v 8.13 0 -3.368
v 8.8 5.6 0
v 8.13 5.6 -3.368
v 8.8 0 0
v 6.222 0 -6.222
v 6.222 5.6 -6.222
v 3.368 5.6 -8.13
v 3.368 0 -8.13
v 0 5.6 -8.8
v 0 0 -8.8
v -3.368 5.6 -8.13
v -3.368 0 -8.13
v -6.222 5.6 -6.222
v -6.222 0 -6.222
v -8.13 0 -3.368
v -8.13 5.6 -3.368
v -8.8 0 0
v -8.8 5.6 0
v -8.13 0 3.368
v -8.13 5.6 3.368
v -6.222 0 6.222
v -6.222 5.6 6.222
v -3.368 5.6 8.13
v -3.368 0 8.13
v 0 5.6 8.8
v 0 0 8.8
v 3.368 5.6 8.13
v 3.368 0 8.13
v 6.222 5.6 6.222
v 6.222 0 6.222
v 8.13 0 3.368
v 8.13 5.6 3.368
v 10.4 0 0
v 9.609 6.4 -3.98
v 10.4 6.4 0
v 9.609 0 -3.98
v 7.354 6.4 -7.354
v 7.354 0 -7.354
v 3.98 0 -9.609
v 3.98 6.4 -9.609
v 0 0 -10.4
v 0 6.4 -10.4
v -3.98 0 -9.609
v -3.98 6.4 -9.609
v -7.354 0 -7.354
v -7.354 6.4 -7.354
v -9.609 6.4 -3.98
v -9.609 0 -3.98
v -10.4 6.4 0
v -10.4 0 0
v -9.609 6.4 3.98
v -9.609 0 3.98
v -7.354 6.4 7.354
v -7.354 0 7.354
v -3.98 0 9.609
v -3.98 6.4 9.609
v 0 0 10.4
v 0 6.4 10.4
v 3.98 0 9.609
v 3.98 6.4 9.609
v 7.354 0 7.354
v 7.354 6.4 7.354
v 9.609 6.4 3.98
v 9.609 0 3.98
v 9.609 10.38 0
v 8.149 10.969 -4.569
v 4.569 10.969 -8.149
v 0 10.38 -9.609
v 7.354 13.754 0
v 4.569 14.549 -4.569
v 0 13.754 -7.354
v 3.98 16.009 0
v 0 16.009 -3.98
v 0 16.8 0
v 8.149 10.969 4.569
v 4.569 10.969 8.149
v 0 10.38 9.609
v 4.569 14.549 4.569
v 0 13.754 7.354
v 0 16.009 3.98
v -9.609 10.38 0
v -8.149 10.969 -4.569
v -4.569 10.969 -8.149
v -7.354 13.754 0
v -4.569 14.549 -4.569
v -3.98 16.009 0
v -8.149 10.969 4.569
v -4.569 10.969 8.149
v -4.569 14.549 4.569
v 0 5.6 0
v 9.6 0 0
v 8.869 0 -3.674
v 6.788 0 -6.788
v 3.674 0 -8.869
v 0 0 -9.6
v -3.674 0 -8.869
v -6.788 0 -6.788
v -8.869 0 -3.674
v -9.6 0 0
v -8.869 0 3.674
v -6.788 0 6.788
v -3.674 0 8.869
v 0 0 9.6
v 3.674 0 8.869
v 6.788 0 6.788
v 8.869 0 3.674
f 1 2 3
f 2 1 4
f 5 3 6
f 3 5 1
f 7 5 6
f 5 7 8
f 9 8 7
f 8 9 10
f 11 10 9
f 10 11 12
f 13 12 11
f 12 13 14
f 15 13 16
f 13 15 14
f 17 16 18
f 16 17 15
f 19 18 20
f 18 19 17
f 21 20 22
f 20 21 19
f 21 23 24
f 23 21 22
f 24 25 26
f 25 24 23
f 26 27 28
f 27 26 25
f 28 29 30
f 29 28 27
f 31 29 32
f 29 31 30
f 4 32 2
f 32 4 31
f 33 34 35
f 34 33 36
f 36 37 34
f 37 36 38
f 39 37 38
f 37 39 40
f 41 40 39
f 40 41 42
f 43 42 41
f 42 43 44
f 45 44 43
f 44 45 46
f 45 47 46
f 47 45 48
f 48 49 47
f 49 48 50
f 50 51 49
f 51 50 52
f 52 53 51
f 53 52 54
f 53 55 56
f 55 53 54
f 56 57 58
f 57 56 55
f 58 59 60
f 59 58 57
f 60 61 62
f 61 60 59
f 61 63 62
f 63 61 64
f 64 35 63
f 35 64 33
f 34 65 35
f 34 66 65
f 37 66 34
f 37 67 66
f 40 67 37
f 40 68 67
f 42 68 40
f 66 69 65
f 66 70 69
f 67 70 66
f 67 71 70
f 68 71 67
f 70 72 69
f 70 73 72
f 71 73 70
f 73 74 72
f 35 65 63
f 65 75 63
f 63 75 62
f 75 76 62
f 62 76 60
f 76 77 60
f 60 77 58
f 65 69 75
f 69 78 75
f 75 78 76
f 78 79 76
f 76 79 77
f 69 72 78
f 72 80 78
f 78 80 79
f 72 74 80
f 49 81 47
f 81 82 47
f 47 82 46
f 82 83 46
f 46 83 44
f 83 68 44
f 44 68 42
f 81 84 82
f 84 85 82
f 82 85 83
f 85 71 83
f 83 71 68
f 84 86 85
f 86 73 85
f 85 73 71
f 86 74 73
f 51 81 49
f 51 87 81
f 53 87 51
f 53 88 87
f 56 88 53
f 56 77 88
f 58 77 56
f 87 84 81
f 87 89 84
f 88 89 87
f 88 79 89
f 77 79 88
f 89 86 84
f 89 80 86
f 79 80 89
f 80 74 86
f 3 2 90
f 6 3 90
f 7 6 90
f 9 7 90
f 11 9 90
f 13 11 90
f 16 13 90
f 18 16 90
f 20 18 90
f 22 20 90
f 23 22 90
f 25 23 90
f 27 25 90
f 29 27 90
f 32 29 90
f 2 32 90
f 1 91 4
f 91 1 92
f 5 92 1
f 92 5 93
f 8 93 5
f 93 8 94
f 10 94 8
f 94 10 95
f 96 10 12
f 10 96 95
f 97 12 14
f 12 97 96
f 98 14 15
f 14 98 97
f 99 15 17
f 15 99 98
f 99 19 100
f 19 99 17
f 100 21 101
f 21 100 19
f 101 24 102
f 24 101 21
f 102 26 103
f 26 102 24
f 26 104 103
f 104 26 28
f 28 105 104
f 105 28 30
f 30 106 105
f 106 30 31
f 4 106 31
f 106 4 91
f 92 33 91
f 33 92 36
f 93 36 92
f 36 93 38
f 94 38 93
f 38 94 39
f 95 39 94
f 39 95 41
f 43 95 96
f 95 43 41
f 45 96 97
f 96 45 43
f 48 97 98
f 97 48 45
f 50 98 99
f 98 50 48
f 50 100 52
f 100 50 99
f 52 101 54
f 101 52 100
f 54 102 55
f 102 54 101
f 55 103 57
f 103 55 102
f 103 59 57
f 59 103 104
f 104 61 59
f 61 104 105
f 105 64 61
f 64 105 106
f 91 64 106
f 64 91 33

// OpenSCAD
// file: ../p/stud3.scad
use <../lib.scad>
use <4-4cyli.scad>
use <4-4disc.scad>
use <4-4edge.scad>
$fa=1; $fs=0.2;
function ldraw_lib__stud3(realsolid=false) = realsolid ? 
    [openscad(translate([0,0,-eps()], o=cylinder(4+eps(), r=4)),2)] : [
// 0 Stud Tube Solid
// 0 Name: stud3.dat
// 0 Author: James Jessiman
// 0 !LDRAW_ORG Primitive UPDATE 2012-01
// 0 !LICENSE Licensed under CC BY 2.0 and CC BY 4.0 : see CAreadme.txt
// 
// 0 BFC CERTIFY CCW
  [0,"BFC","CERTIFY"],
  [0,"BFC","CCW"],
// 
// 0 !HISTORY 2002-04-04 [sbliss] Modified for BFC compliance
// 0 !HISTORY 2002-04-25 [PTadmin] Official Update 2002-02
// 0 !HISTORY 2007-06-24 [PTadmin] Header formatted for Contributor Agreement
// 0 !HISTORY 2008-07-01 [PTadmin] Official Update 2008-01
// 0 !HISTORY 2012-02-16 [Philo] Changed to CCW
// 0 !HISTORY 2012-03-30 [PTadmin] Official Update 2012-01
// 
// 
// 1 16 0 -4 0 4 0 0 0 1 0 0 0 4 4-4edge.dat
  [1,16,0,-4,0,4,0,0,0,1,0,0,0,4, ldraw_lib__4_4edge(realsolid)],
// 1 16 0 0 0 4 0 0 0 1 0 0 0 4 4-4edge.dat
  [1,16,0,0,0,4,0,0,0,1,0,0,0,4, ldraw_lib__4_4edge(realsolid)],
// 1 16 0 -4 0 4 0 0 0 1 0 0 0 4 4-4disc.dat
  [1,16,0,-4,0,4,0,0,0,1,0,0,0,4, ldraw_lib__4_4disc(realsolid)],
// 1 16 0 -4 0 4 0 0 0 4 0 0 0 4 4-4cyli.dat
  [1,16,0,-4,0,4,0,0,0,4,0,0,0,4, ldraw_lib__4_4cyli(realsolid)],
];
module ldraw_lib__stud3(step=0, col=false, unit=2/5, alt=false, line=0.2, solid=!$preview)
    makepoly(ldraw_lib__stud3(solid), step=step, col=col, unit=unit, alt=alt, line=line, solid=solid);
ldraw_lib__stud3(line=0.2);
// file: ../p/stud.scad
use <../lib.scad>
use <4-4cyli.scad>
use <4-4disc.scad>
use <4-4edge.scad>
$fa=1; $fs=0.2;
function ldraw_lib__stud(realsolid=false) = realsolid ? 
    [openscad(translate([0,0,-eps()], o=cylinder(4+eps(), r=6)),2)] : [
// 0 Stud
// 0 Name: stud.dat
// 0 Author: James Jessiman
// 0 !LDRAW_ORG Primitive UPDATE 2012-01
// 0 !LICENSE Licensed under CC BY 2.0 and CC BY 4.0 : see CAreadme.txt
// 
// 0 BFC CERTIFY CCW
  [0,"BFC","CERTIFY"],
  [0,"BFC","CCW"],
// 
// 0 !HISTORY 2002-04-04 [sbliss] Modified for BFC compliance
// 0 !HISTORY 2002-04-25 [PTadmin] Official Update 2002-02
// 0 !HISTORY 2007-06-24 [PTadmin] Header formatted for Contributor Agreement
// 0 !HISTORY 2008-07-01 [PTadmin] Official Update 2008-01
// 0 !HISTORY 2012-02-16 [Philo] Changed to CCW
// 0 !HISTORY 2012-03-30 [PTadmin] Official Update 2012-01
// 
// 
// 1 16 0 0 0 6 0 0 0 1 0 0 0 6 4-4edge.dat
  [1,16,0,0,0,6,0,0,0,1,0,0,0,6, ldraw_lib__4_4edge(realsolid)],
// 1 16 0 -4 0 6 0 0 0 1 0 0 0 6 4-4edge.dat
  [1,16,0,-4,0,6,0,0,0,1,0,0,0,6, ldraw_lib__4_4edge(realsolid)],
// 1 16 0 0 0 6 0 0 0 -4 0 0 0 6 4-4cyli.dat
  [1,16,0,0,0,6,0,0,0,-4,0,0,0,6, ldraw_lib__4_4cyli(realsolid)],
// 1 16 0 -4 0 6 0 0 0 1 0 0 0 6 4-4disc.dat
  [1,16,0,-4,0,6,0,0,0,1,0,0,0,6, ldraw_lib__4_4disc(realsolid)],
];
module ldraw_lib__stud(step=0, col=false, unit=2/5, alt=false, line=0.2, solid=!$preview)
    makepoly(ldraw_lib__stud(solid), step=step, col=col, unit=unit, alt=alt, line=line, solid=solid);
ldraw_lib__stud(line=0.2);
// file: ../p/box5.scad
use <../lib.scad>
$fa=1; $fs=0.2;
function ldraw_lib__box5(realsolid=false) = [
// 0 Box with 5 Faces and All Edges
// 0 Name: box5.dat
// 0 Author: James Jessiman
// 0 !LDRAW_ORG Primitive UPDATE 2012-01
// 0 !LICENSE Licensed under CC BY 2.0 and CC BY 4.0 : see CAreadme.txt
// 
// 0 BFC CERTIFY CCW
  [0,"BFC","CERTIFY"],
  [0,"BFC","CCW"],
// 
// 0 !HISTORY 2002-04-03 [sbliss] Modified for BFC compliance
// 0 !HISTORY 2002-04-25 [PTadmin] Official Update 2002-02
// 0 !HISTORY 2007-06-24 [PTadmin] Header formatted for Contributor Agreement
// 0 !HISTORY 2008-07-01 [PTadmin] Official Update 2008-01
// 0 !HISTORY 2012-02-16 [Philo] Changed to CCW
// 0 !HISTORY 2012-03-30 [PTadmin] Official Update 2012-01
// 
// 
// 2 24 1 1 1 -1 1 1
  [2,24,1,1,1,-1,1,1],
// 2 24 -1 1 1 -1 1 -1
  [2,24,-1,1,1,-1,1,-1],
// 2 24 -1 1 -1 1 1 -1
  [2,24,-1,1,-1,1,1,-1],
// 2 24 1 1 -1 1 1 1
  [2,24,1,1,-1,1,1,1],
// 2 24 1 0 1 -1 0 1
  [2,24,1,0,1,-1,0,1],
// 2 24 -1 0 1 -1 0 -1
  [2,24,-1,0,1,-1,0,-1],
// 2 24 -1 0 -1 1 0 -1
  [2,24,-1,0,-1,1,0,-1],
// 2 24 1 0 -1 1 0 1
  [2,24,1,0,-1,1,0,1],
// 2 24 1 0 1 1 1 1
  [2,24,1,0,1,1,1,1],
// 2 24 -1 0 1 -1 1 1
  [2,24,-1,0,1,-1,1,1],
// 2 24 1 0 -1 1 1 -1
  [2,24,1,0,-1,1,1,-1],
// 2 24 -1 0 -1 -1 1 -1
  [2,24,-1,0,-1,-1,1,-1],
// 4 16 -1 1 1 1 1 1 1 1 -1 -1 1 -1
  [4,16,-1,1,1,1,1,1,1,1,-1,-1,1,-1],
// 4 16 -1 1 1 -1 0 1 1 0 1 1 1 1
  [4,16,-1,1,1,-1,0,1,1,0,1,1,1,1],
// 4 16 -1 1 -1 -1 0 -1 -1 0 1 -1 1 1
  [4,16,-1,1,-1,-1,0,-1,-1,0,1,-1,1,1],
// 4 16 1 1 -1 1 0 -1 -1 0 -1 -1 1 -1
  [4,16,1,1,-1,1,0,-1,-1,0,-1,-1,1,-1],
// 4 16 1 1 1 1 0 1 1 0 -1 1 1 -1
  [4,16,1,1,1,1,0,1,1,0,-1,1,1,-1],
];
module ldraw_lib__box5(step=0, col=false, unit=2/5, alt=false, line=0.2, solid=!$preview)
    makepoly(ldraw_lib__box5(solid), step=step, col=col, unit=unit, alt=alt, line=line, solid=solid);
ldraw_lib__box5(line=0.2);
// file: ../p/box4t.scad
use <../lib.scad>
$fa=1; $fs=0.2;
function ldraw_lib__box4t(realsolid=false) = [
// 0 Box with 4 Adjacent Faces and All Edges
// 0 Name: box4t.dat
// 0 Author: Tore Eriksson [Tore_Eriksson]
// 0 !LDRAW_ORG Primitive UPDATE 2003-02
// 0 !LICENSE Licensed under CC BY 2.0 and CC BY 4.0 : see CAreadme.txt
// 
// 0 BFC CERTIFY CCW
  [0,"BFC","CERTIFY"],
  [0,"BFC","CCW"],
// 
// 0 !HISTORY 1997-09-29 [PTadmin] Official Update 1997-15
// 0 !HISTORY 2002-08-31 [izanette] Modified with WINDZ for BFC compliance
// 0 !HISTORY 2003-08-01 [PTadmin] Official Update 2003-02
// 0 !HISTORY 2007-06-24 [PTadmin] Header formatted for Contributor Agreement
// 0 !HISTORY 2008-07-01 [PTadmin] Official Update 2008-01
// 
// 
// 2 24 1 1 1 -1 1 1
  [2,24,1,1,1,-1,1,1],
// 2 24 -1 1 1 -1 1 -1
  [2,24,-1,1,1,-1,1,-1],
// 2 24 -1 1 -1 1 1 -1
  [2,24,-1,1,-1,1,1,-1],
// 2 24 1 1 -1 1 1 1
  [2,24,1,1,-1,1,1,1],
// 2 24 1 0 1 -1 0 1
  [2,24,1,0,1,-1,0,1],
// 2 24 -1 0 1 -1 0 -1
  [2,24,-1,0,1,-1,0,-1],
// 2 24 -1 0 -1 1 0 -1
  [2,24,-1,0,-1,1,0,-1],
// 2 24 1 0 -1 1 0 1
  [2,24,1,0,-1,1,0,1],
// 2 24 1 0 1 1 1 1
  [2,24,1,0,1,1,1,1],
// 2 24 -1 0 1 -1 1 1
  [2,24,-1,0,1,-1,1,1],
// 2 24 1 0 -1 1 1 -1
  [2,24,1,0,-1,1,1,-1],
// 2 24 -1 0 -1 -1 1 -1
  [2,24,-1,0,-1,-1,1,-1],
// 4 16 1 1 1 1 1 -1 -1 1 -1 -1 1 1
  [4,16,1,1,1,1,1,-1,-1,1,-1,-1,1,1],
// 4 16 1 1 1 -1 1 1 -1 0 1 1 0 1
  [4,16,1,1,1,-1,1,1,-1,0,1,1,0,1],
// 4 16 -1 1 1 -1 1 -1 -1 0 -1 -1 0 1
  [4,16,-1,1,1,-1,1,-1,-1,0,-1,-1,0,1],
// 0 4 16 -1 1 -1 -1 0 -1 1 0 -1 1 1 -1
// 4 16 1 1 -1 1 1 1 1 0 1 1 0 -1
  [4,16,1,1,-1,1,1,1,1,0,1,1,0,-1],
// 0
];
module ldraw_lib__box4t(step=0, col=false, unit=2/5, alt=false, line=0.2, solid=!$preview)
    makepoly(ldraw_lib__box4t(solid), step=step, col=col, unit=unit, alt=alt, line=line, solid=solid);
ldraw_lib__box4t(line=0.2);
// file: s/3004s01.scad
use <../../lib.scad>
use <../../p/box4t.scad>
use <../../p/box5.scad>
use <../../p/stud.scad>
use <../../p/stud3.scad>
$fa=1; $fs=0.2;
function ldraw_lib__s__3004s01(realsolid=false) = [
// 0 ~Brick  1 x  2 without Front Face
// 0 Name: s\3004s01.dat
// 0 Author: James Jessiman
// 0 !LDRAW_ORG Subpart UPDATE 2003-03
// 0 !LICENSE Licensed under CC BY 2.0 and CC BY 4.0 : see CAreadme.txt
// 
// 0 BFC CERTIFY CCW
  [0,"BFC","CERTIFY"],
  [0,"BFC","CCW"],
// 
// 0 !HISTORY 2003-09-07 [jriley] Subfiling, BFC
// 0 !HISTORY 2003-12-19 [PTadmin] Official Update 2003-03
// 0 !HISTORY 2007-08-29 [PTadmin] Header formatted for Contributor Agreement
// 0 !HISTORY 2008-07-01 [PTadmin] Official Update 2008-01
// 
// 
// 1 16 0 4 0 1 0 0 0 -5 0 0 0 1 stud3.dat
  [1,16,0,4,0,1,0,0,0,-5,0,0,0,1, ldraw_lib__stud3(realsolid)],
// 0 BFC INVERTNEXT
  [0,"BFC","INVERTNEXT"],
// 1 16 0 24 0 16 0 0 0 -20 0 0 0 6 box5.dat
  [1,16,0,24,0,16,0,0,0,-20,0,0,0,6, ldraw_lib__box5(realsolid)],
// 4 16 20 24 10 16 24 6 -16 24 6 -20 24 10
  [4,16,20,24,10,16,24,6,-16,24,6,-20,24,10],
// 4 16 -20 24 10 -16 24 6 -16 24 -6 -20 24 -10
  [4,16,-20,24,10,-16,24,6,-16,24,-6,-20,24,-10],
// 4 16 -20 24 -10 -16 24 -6 16 24 -6 20 24 -10
  [4,16,-20,24,-10,-16,24,-6,16,24,-6,20,24,-10],
// 4 16 20 24 -10 16 24 -6 16 24 6 20 24 10
  [4,16,20,24,-10,16,24,-6,16,24,6,20,24,10],
// 1 16 0 24 0 20 0 0 0 -24 0 0 0 10 box4t.dat
  [1,16,0,24,0,20,0,0,0,-24,0,0,0,10, ldraw_lib__box4t(realsolid)],
// 1 16 10 0 0 1 0 0 0 1 0 0 0 1 stud.dat
  [1,16,10,0,0,1,0,0,0,1,0,0,0,1, ldraw_lib__stud(realsolid)],
// 1 16 -10 0 0 1 0 0 0 1 0 0 0 1 stud.dat
  [1,16,-10,0,0,1,0,0,0,1,0,0,0,1, ldraw_lib__stud(realsolid)],
// 0
];
module ldraw_lib__s__3004s01(step=0, col=false, unit=2/5, alt=false, line=0.2, solid=!$preview)
    makepoly(ldraw_lib__s__3004s01(solid), step=step, col=col, unit=unit, alt=alt, line=line, solid=solid);
ldraw_lib__s__3004s01(line=0.2);
// file: ../p/1-8sphe.scad
use <../lib.scad>
$fa=1; $fs=0.2;
function ldraw_lib__1_8sphe(realsolid=false) = [
// 0 Sphere 0.125
// 0 Name: 1-8sphe.dat
// 0 Author: James Jessiman
// 0 !LDRAW_ORG Primitive UPDATE 2012-03
// 0 !LICENSE Licensed under CC BY 2.0 and CC BY 4.0 : see CAreadme.txt
// 
// 0 BFC CERTIFY CCW
  [0,"BFC","CERTIFY"],
  [0,"BFC","CCW"],
// 
// 0 !HISTORY 2000-08-01 {Axel Poque} fixes to resolve L3P error messages.
// 0 !HISTORY 2000-08-01 {Manfred Moolhuysen} fixes to resolve L3P error messages.
// 0 !HISTORY 2000-09-30 [PTadmin] Official Update 2000-02
// 0 !HISTORY 2002-03-28 [hafhead] Made BFC compliant
// 0 !HISTORY 2002-04-25 [PTadmin] Official Update 2002-02
// 0 !HISTORY 2007-06-22 [PTadmin] Header formatted for Contributor Agreement
// 0 !HISTORY 2008-07-01 [PTadmin] Official Update 2008-01
// 0 !HISTORY 2010-09-12 [MagFors] Changed winding, removed duplicated cond-line, optimized filesize
// 0 !HISTORY 2010-12-31 [PTadmin] Official Update 2010-03
// 0 !HISTORY 2012-07-01 [tcobbs] Replaced with geometry from LDView
// 0 !HISTORY 2012-12-28 [PTadmin] Official Update 2012-03
// 
// 
// 3 16 1 0 0 0.9239 0.3827 0 0.9239 0 0.3827
  [3,16,1,0,0,0.9239,0.3827,0,0.9239,0,0.3827],
// 3 16 0.9239 0.3827 0 0.7836 0.4393 0.4393 0.9239 0 0.3827
  [3,16,0.9239,0.3827,0,0.7836,0.4393,0.4393,0.9239,0,0.3827],
// 3 16 0.9239 0 0.3827 0.7836 0.4393 0.4393 0.7071 0 0.7071
  [3,16,0.9239,0,0.3827,0.7836,0.4393,0.4393,0.7071,0,0.7071],
// 3 16 0.7836 0.4393 0.4393 0.4393 0.4393 0.7836 0.7071 0 0.7071
  [3,16,0.7836,0.4393,0.4393,0.4393,0.4393,0.7836,0.7071,0,0.7071],
// 3 16 0.7071 0 0.7071 0.4393 0.4393 0.7836 0.3827 0 0.9239
  [3,16,0.7071,0,0.7071,0.4393,0.4393,0.7836,0.3827,0,0.9239],
// 3 16 0.4393 0.4393 0.7836 0 0.3827 0.9239 0.3827 0 0.9239
  [3,16,0.4393,0.4393,0.7836,0,0.3827,0.9239,0.3827,0,0.9239],
// 3 16 0.3827 0 0.9239 0 0.3827 0.9239 0 0 1
  [3,16,0.3827,0,0.9239,0,0.3827,0.9239,0,0,1],
// 3 16 0.9239 0.3827 0 0.7071 0.7071 0 0.7836 0.4393 0.4393
  [3,16,0.9239,0.3827,0,0.7071,0.7071,0,0.7836,0.4393,0.4393],
// 3 16 0.7071 0.7071 0 0.4393 0.7836 0.4393 0.7836 0.4393 0.4393
  [3,16,0.7071,0.7071,0,0.4393,0.7836,0.4393,0.7836,0.4393,0.4393],
// 3 16 0.7836 0.4393 0.4393 0.4393 0.7836 0.4393 0.4393 0.4393 0.7836
  [3,16,0.7836,0.4393,0.4393,0.4393,0.7836,0.4393,0.4393,0.4393,0.7836],
// 3 16 0.4393 0.7836 0.4393 0 0.7071 0.7071 0.4393 0.4393 0.7836
  [3,16,0.4393,0.7836,0.4393,0,0.7071,0.7071,0.4393,0.4393,0.7836],
// 3 16 0.4393 0.4393 0.7836 0 0.7071 0.7071 0 0.3827 0.9239
  [3,16,0.4393,0.4393,0.7836,0,0.7071,0.7071,0,0.3827,0.9239],
// 3 16 0.7071 0.7071 0 0.3827 0.9239 0 0.4393 0.7836 0.4393
  [3,16,0.7071,0.7071,0,0.3827,0.9239,0,0.4393,0.7836,0.4393],
// 3 16 0.3827 0.9239 0 0 0.9239 0.3827 0.4393 0.7836 0.4393
  [3,16,0.3827,0.9239,0,0,0.9239,0.3827,0.4393,0.7836,0.4393],
// 3 16 0.4393 0.7836 0.4393 0 0.9239 0.3827 0 0.7071 0.7071
  [3,16,0.4393,0.7836,0.4393,0,0.9239,0.3827,0,0.7071,0.7071],
// 3 16 0.3827 0.9239 0 0 1 0 0 0.9239 0.3827
  [3,16,0.3827,0.9239,0,0,1,0,0,0.9239,0.3827],
// 
// 5 24 1 0 0 0.9239 0.3827 0 1 0 -0.1 0.9239 0 0.3827
  [5,24,1,0,0,0.9239,0.3827,0,1,0,-0.1,0.9239,0,0.3827],
// 5 24 0.9239 0.3827 0 0.9239 0 0.3827 1 0 0 0.7836 0.4393 0.4393
  [5,24,0.9239,0.3827,0,0.9239,0,0.3827,1,0,0,0.7836,0.4393,0.4393],
// 5 24 1 0 0 0.9239 0 0.3827 0.9239 0.3827 0 1 -0.1 0
  [5,24,1,0,0,0.9239,0,0.3827,0.9239,0.3827,0,1,-0.1,0],
// 5 24 0.9239 0 0.3827 0.7836 0.4393 0.4393 0.9239 0.3827 0 0.7071 0 0.7071
  [5,24,0.9239,0,0.3827,0.7836,0.4393,0.4393,0.9239,0.3827,0,0.7071,0,0.7071],
// 5 24 0.7836 0.4393 0.4393 0.7071 0 0.7071 0.9239 0 0.3827 0.4393 0.4393 0.7836
  [5,24,0.7836,0.4393,0.4393,0.7071,0,0.7071,0.9239,0,0.3827,0.4393,0.4393,0.7836],
// 5 24 0.9239 0 0.3827 0.7071 0 0.7071 0.7836 0.4393 0.4393 0.9239 -0.1 0.3827
  [5,24,0.9239,0,0.3827,0.7071,0,0.7071,0.7836,0.4393,0.4393,0.9239,-0.1,0.3827],
// 5 24 0.7071 0 0.7071 0.4393 0.4393 0.7836 0.7836 0.4393 0.4393 0.3827 0 0.9239
  [5,24,0.7071,0,0.7071,0.4393,0.4393,0.7836,0.7836,0.4393,0.4393,0.3827,0,0.9239],
// 5 24 0.4393 0.4393 0.7836 0.3827 0 0.9239 0.7071 0 0.7071 0 0.3827 0.9239
  [5,24,0.4393,0.4393,0.7836,0.3827,0,0.9239,0.7071,0,0.7071,0,0.3827,0.9239],
// 5 24 0.7071 0 0.7071 0.3827 0 0.9239 0.4393 0.4393 0.7836 0.7071 -0.1 0.7071
  [5,24,0.7071,0,0.7071,0.3827,0,0.9239,0.4393,0.4393,0.7836,0.7071,-0.1,0.7071],
// 5 24 0.3827 0 0.9239 0 0.3827 0.9239 0.4393 0.4393 0.7836 0 0 1
  [5,24,0.3827,0,0.9239,0,0.3827,0.9239,0.4393,0.4393,0.7836,0,0,1],
// 5 24 0 0.3827 0.9239 0 0 1 0.3827 0 0.9239 -0.1 0.3827 0.9239
  [5,24,0,0.3827,0.9239,0,0,1,0.3827,0,0.9239,-0.1,0.3827,0.9239],
// 5 24 0.3827 0 0.9239 0 0 1 0 0.3827 0.9239 0.3827 -0.1 0.9239
  [5,24,0.3827,0,0.9239,0,0,1,0,0.3827,0.9239,0.3827,-0.1,0.9239],
// 5 24 0.9239 0.3827 0 0.7071 0.7071 0 0.9239 0.3827 -0.1 0.7836 0.4393 0.4393
  [5,24,0.9239,0.3827,0,0.7071,0.7071,0,0.9239,0.3827,-0.1,0.7836,0.4393,0.4393],
// 5 24 0.7071 0.7071 0 0.7836 0.4393 0.4393 0.9239 0.3827 0 0.4393 0.7836 0.4393
  [5,24,0.7071,0.7071,0,0.7836,0.4393,0.4393,0.9239,0.3827,0,0.4393,0.7836,0.4393],
// 5 24 0.9239 0.3827 0 0.7836 0.4393 0.4393 0.7071 0.7071 0 0.9239 0 0.3827
  [5,24,0.9239,0.3827,0,0.7836,0.4393,0.4393,0.7071,0.7071,0,0.9239,0,0.3827],
// 5 24 0.7836 0.4393 0.4393 0.4393 0.7836 0.4393 0.7071 0.7071 0 0.4393 0.4393 0.7836
  [5,24,0.7836,0.4393,0.4393,0.4393,0.7836,0.4393,0.7071,0.7071,0,0.4393,0.4393,0.7836],
// 5 24 0.4393 0.7836 0.4393 0.4393 0.4393 0.7836 0.7836 0.4393 0.4393 0 0.7071 0.7071
  [5,24,0.4393,0.7836,0.4393,0.4393,0.4393,0.7836,0.7836,0.4393,0.4393,0,0.7071,0.7071],
// 5 24 0.7836 0.4393 0.4393 0.4393 0.4393 0.7836 0.4393 0.7836 0.4393 0.7071 0 0.7071
  [5,24,0.7836,0.4393,0.4393,0.4393,0.4393,0.7836,0.4393,0.7836,0.4393,0.7071,0,0.7071],
// 5 24 0.4393 0.4393 0.7836 0 0.7071 0.7071 0.4393 0.7836 0.4393 0 0.3827 0.9239
  [5,24,0.4393,0.4393,0.7836,0,0.7071,0.7071,0.4393,0.7836,0.4393,0,0.3827,0.9239],
// 5 24 0 0.7071 0.7071 0 0.3827 0.9239 0.4393 0.4393 0.7836 -0.1 0.7071 0.7071
  [5,24,0,0.7071,0.7071,0,0.3827,0.9239,0.4393,0.4393,0.7836,-0.1,0.7071,0.7071],
// 5 24 0.4393 0.4393 0.7836 0 0.3827 0.9239 0 0.7071 0.7071 0.3827 0 0.9239
  [5,24,0.4393,0.4393,0.7836,0,0.3827,0.9239,0,0.7071,0.7071,0.3827,0,0.9239],
// 5 24 0.7071 0.7071 0 0.3827 0.9239 0 0.7071 0.7071 -0.1 0.4393 0.7836 0.4393
  [5,24,0.7071,0.7071,0,0.3827,0.9239,0,0.7071,0.7071,-0.1,0.4393,0.7836,0.4393],
// 5 24 0.3827 0.9239 0 0.4393 0.7836 0.4393 0.7071 0.7071 0 0 0.9239 0.3827
  [5,24,0.3827,0.9239,0,0.4393,0.7836,0.4393,0.7071,0.7071,0,0,0.9239,0.3827],
// 5 24 0.7071 0.7071 0 0.4393 0.7836 0.4393 0.3827 0.9239 0 0.7836 0.4393 0.4393
  [5,24,0.7071,0.7071,0,0.4393,0.7836,0.4393,0.3827,0.9239,0,0.7836,0.4393,0.4393],
// 5 24 0.4393 0.7836 0.4393 0 0.9239 0.3827 0.3827 0.9239 0 0 0.7071 0.7071
  [5,24,0.4393,0.7836,0.4393,0,0.9239,0.3827,0.3827,0.9239,0,0,0.7071,0.7071],
// 5 24 0 0.9239 0.3827 0 0.7071 0.7071 0.4393 0.7836 0.4393 -0.1 0.9239 0.3827
  [5,24,0,0.9239,0.3827,0,0.7071,0.7071,0.4393,0.7836,0.4393,-0.1,0.9239,0.3827],
// 5 24 0.4393 0.7836 0.4393 0 0.7071 0.7071 0 0.9239 0.3827 0.4393 0.4393 0.7836
  [5,24,0.4393,0.7836,0.4393,0,0.7071,0.7071,0,0.9239,0.3827,0.4393,0.4393,0.7836],
// 5 24 0.3827 0.9239 0 0 1 0 0.3827 0.9239 -0.1 0 0.9239 0.3827
  [5,24,0.3827,0.9239,0,0,1,0,0.3827,0.9239,-0.1,0,0.9239,0.3827],
// 5 24 0 1 0 0 0.9239 0.3827 0.3827 0.9239 0 -0.1 1 0
  [5,24,0,1,0,0,0.9239,0.3827,0.3827,0.9239,0,-0.1,1,0],
// 5 24 0.3827 0.9239 0 0 0.9239 0.3827 0 1 0 0.4393 0.7836 0.4393
  [5,24,0.3827,0.9239,0,0,0.9239,0.3827,0,1,0,0.4393,0.7836,0.4393],
];
module ldraw_lib__1_8sphe(step=0, col=false, unit=2/5, alt=false, line=0.2, solid=!$preview)
    makepoly(ldraw_lib__1_8sphe(solid), step=step, col=col, unit=unit, alt=alt, line=line, solid=solid);
ldraw_lib__1_8sphe(line=0.2);
// file: 3004.scad
use <../lib.scad>
use <s/3004s01.scad>
$fa=1; $fs=0.2;
function ldraw_lib__3004(realsolid=false) = [
// 0 Brick  1 x  2
// 0 Name: 3004.dat
// 0 Author: James Jessiman
// 0 !LDRAW_ORG Part UPDATE 2022-05
// 0 !LICENSE Licensed under CC BY 2.0 and CC BY 4.0 : see CAreadme.txt
// 
// 0 BFC CERTIFY CCW
  [0,"BFC","CERTIFY"],
  [0,"BFC","CCW"],
// 
// 0 !HISTORY 2001-10-26 [PTadmin] Official Update 2001-01
// 0 !HISTORY 2002-05-07 {unknown} BFC Certification
// 0 !HISTORY 2002-06-11 [PTadmin] Official Update 2002-03
// 0 !HISTORY 2007-05-07 [PTadmin] Header formatted for Contributor Agreement
// 0 !HISTORY 2008-07-01 [PTadmin] Official Update 2008-01
// 0 !HISTORY 2022-08-04 [MagFors] Using subfile
// 0 !HISTORY 2022-09-15 [PTadmin] Official Update 2022-05
// 
// 
// 1 16 0 0 0 1 0 0 0 1 0 0 0 1 s\3004s01.dat
  [1,16,0,0,0,1,0,0,0,1,0,0,0,1, ldraw_lib__s__3004s01(realsolid)],
// 4 16 -20 24 -10 20 24 -10 20 0 -10 -20 0 -10
  [4,16,-20,24,-10,20,24,-10,20,0,-10,-20,0,-10],
];
module ldraw_lib__3004(step=0, col=false, unit=2/5, alt=false, line=0.2, solid=!$preview)
    makepoly(ldraw_lib__3004(solid), step=step, col=col, unit=unit, alt=alt, line=line, solid=solid);
ldraw_lib__3004(line=0.2);
// file: ../p/4-8sphe.scad
use <../lib.scad>
use <1-8sphe.scad>
$fa=1; $fs=0.2;
function ldraw_lib__4_8sphe(realsolid=false) = [
// 0 Sphere 0.5
// 0 Name: 4-8sphe.dat
// 0 Author: James Jessiman
// 0 !LDRAW_ORG Primitive UPDATE 2003-02
// 0 !LICENSE Licensed under CC BY 2.0 and CC BY 4.0 : see CAreadme.txt
// 
// 0 BFC CERTIFY CCW
  [0,"BFC","CERTIFY"],
  [0,"BFC","CCW"],
// 
// 0 !HISTORY 2002-08-31 [izanette] Modified with WINDZ for BFC compliance
// 0 !HISTORY 2003-08-01 [PTadmin] Official Update 2003-02
// 0 !HISTORY 2007-06-24 [PTadmin] Header formatted for Contributor Agreement
// 0 !HISTORY 2008-07-01 [PTadmin] Official Update 2008-01
// 
// 
// 1 16 0 0 0 1 0 0 0 1 0 0 0 1 1-8sphe.dat
  [1,16,0,0,0,1,0,0,0,1,0,0,0,1, ldraw_lib__1_8sphe(realsolid)],
// 1 16 0 0 0 1 0 0 0 1 0 0 0 -1 1-8sphe.dat
  [1,16,0,0,0,1,0,0,0,1,0,0,0,-1, ldraw_lib__1_8sphe(realsolid)],
// 1 16 0 0 0 -1 0 0 0 1 0 0 0 1 1-8sphe.dat
  [1,16,0,0,0,-1,0,0,0,1,0,0,0,1, ldraw_lib__1_8sphe(realsolid)],
// 1 16 0 0 0 -1 0 0 0 1 0 0 0 -1 1-8sphe.dat
  [1,16,0,0,0,-1,0,0,0,1,0,0,0,-1, ldraw_lib__1_8sphe(realsolid)],
// 0
// 
];
module ldraw_lib__4_8sphe(step=0, col=false, unit=2/5, alt=false, line=0.2, solid=!$preview)
    makepoly(ldraw_lib__4_8sphe(solid), step=step, col=col, unit=unit, alt=alt, line=line, solid=solid);
ldraw_lib__4_8sphe(line=0.2);
// file: ../p/4-4rin12.scad
use <../lib.scad>
$fa=1; $fs=0.2;
function ldraw_lib__4_4rin12(realsolid=false) = [
// 0 Ring 12 x 1.0
// 0 Name: 4-4rin12.dat
// 0 Author: John Riley [jriley]
// 0 !LDRAW_ORG Primitive UPDATE 2003-03
// 0 !LICENSE Licensed under CC BY 2.0 and CC BY 4.0 : see CAreadme.txt
// 
// 0 BFC CERTIFY CCW
  [0,"BFC","CERTIFY"],
  [0,"BFC","CCW"],
// 
// 0 !HISTORY 2003-12-19 [PTadmin] Official Update 2003-03
// 0 !HISTORY 2007-06-24 [PTadmin] Header formatted for Contributor Agreement
// 0 !HISTORY 2008-07-01 [PTadmin] Official Update 2008-01
// 
// 
// 4 16 12 0 0 13 0 0 12.0107 0 4.9751 11.0868 0 4.5924
  [4,16,12,0,0,13,0,0,12.0107,0,4.9751,11.0868,0,4.5924],
// 4 16 11.0868 0 4.5924 12.0107 0 4.9751 9.1923 0 9.1923 8.4852 0 8.4852
  [4,16,11.0868,0,4.5924,12.0107,0,4.9751,9.1923,0,9.1923,8.4852,0,8.4852],
// 4 16 8.4852 0 8.4852 9.1923 0 9.1923 4.9751 0 12.0107 4.5924 0 11.0868
  [4,16,8.4852,0,8.4852,9.1923,0,9.1923,4.9751,0,12.0107,4.5924,0,11.0868],
// 4 16 4.5924 0 11.0868 4.9751 0 12.0107 0 0 13 0 0 12
  [4,16,4.5924,0,11.0868,4.9751,0,12.0107,0,0,13,0,0,12],
// 4 16 0 0 12 0 0 13 -4.9751 0 12.0107 -4.5924 0 11.0868
  [4,16,0,0,12,0,0,13,-4.9751,0,12.0107,-4.5924,0,11.0868],
// 4 16 -4.5924 0 11.0868 -4.9751 0 12.0107 -9.1923 0 9.1923 -8.4852 0 8.4852
  [4,16,-4.5924,0,11.0868,-4.9751,0,12.0107,-9.1923,0,9.1923,-8.4852,0,8.4852],
// 4 16 -8.4852 0 8.4852 -9.1923 0 9.1923 -12.0107 0 4.9751 -11.0868 0 4.5924
  [4,16,-8.4852,0,8.4852,-9.1923,0,9.1923,-12.0107,0,4.9751,-11.0868,0,4.5924],
// 4 16 -11.0868 0 4.5924 -12.0107 0 4.9751 -13 0 0 -12 0 0
  [4,16,-11.0868,0,4.5924,-12.0107,0,4.9751,-13,0,0,-12,0,0],
// 4 16 -12 0 0 -13 0 0 -12.0107 0 -4.9751 -11.0868 0 -4.5924
  [4,16,-12,0,0,-13,0,0,-12.0107,0,-4.9751,-11.0868,0,-4.5924],
// 4 16 -11.0868 0 -4.5924 -12.0107 0 -4.9751 -9.1923 0 -9.1923 -8.4852 0 -8.4852
  [4,16,-11.0868,0,-4.5924,-12.0107,0,-4.9751,-9.1923,0,-9.1923,-8.4852,0,-8.4852],
// 4 16 -8.4852 0 -8.4852 -9.1923 0 -9.1923 -4.9751 0 -12.0107 -4.5924 0 -11.0868
  [4,16,-8.4852,0,-8.4852,-9.1923,0,-9.1923,-4.9751,0,-12.0107,-4.5924,0,-11.0868],
// 4 16 -4.5924 0 -11.0868 -4.9751 0 -12.0107 0 0 -13 0 0 -12
  [4,16,-4.5924,0,-11.0868,-4.9751,0,-12.0107,0,0,-13,0,0,-12],
// 4 16 0 0 -12 0 0 -13 4.9751 0 -12.0107 4.5924 0 -11.0868
  [4,16,0,0,-12,0,0,-13,4.9751,0,-12.0107,4.5924,0,-11.0868],
// 4 16 4.5924 0 -11.0868 4.9751 0 -12.0107 9.1923 0 -9.1923 8.4852 0 -8.4852
  [4,16,4.5924,0,-11.0868,4.9751,0,-12.0107,9.1923,0,-9.1923,8.4852,0,-8.4852],
// 4 16 8.4852 0 -8.4852 9.1923 0 -9.1923 12.0107 0 -4.9751 11.0868 0 -4.5924
  [4,16,8.4852,0,-8.4852,9.1923,0,-9.1923,12.0107,0,-4.9751,11.0868,0,-4.5924],
// 4 16 11.0868 0 -4.5924 12.0107 0 -4.9751 13 0 0 12 0 0
  [4,16,11.0868,0,-4.5924,12.0107,0,-4.9751,13,0,0,12,0,0],
// 0
// 
];
module ldraw_lib__4_4rin12(step=0, col=false, unit=2/5, alt=false, line=0.2, solid=!$preview)
    makepoly(ldraw_lib__4_4rin12(solid), step=step, col=col, unit=unit, alt=alt, line=line, solid=solid);
ldraw_lib__4_4rin12(line=0.2);
// file: ../p/4-4rin11.scad
use <../lib.scad>
$fa=1; $fs=0.2;
function ldraw_lib__4_4rin11(realsolid=false) = [
// 0 Ring 11 x 1.0
// 0 Name: 4-4rin11.dat
// 0 Author: John Riley [jriley]
// 0 !LDRAW_ORG Primitive UPDATE 2003-03
// 0 !LICENSE Licensed under CC BY 2.0 and CC BY 4.0 : see CAreadme.txt
// 
// 0 BFC CERTIFY CCW
  [0,"BFC","CERTIFY"],
  [0,"BFC","CCW"],
// 
// 0 !HISTORY 2003-12-19 [PTadmin] Official Update 2003-03
// 0 !HISTORY 2007-06-24 [PTadmin] Header formatted for Contributor Agreement
// 0 !HISTORY 2008-07-01 [PTadmin] Official Update 2008-01
// 
// 
// 4 16 11 0 0 12 0 0 11.0868 0 4.5924 10.1629 0 4.2097
  [4,16,11,0,0,12,0,0,11.0868,0,4.5924,10.1629,0,4.2097],
// 4 16 10.1629 0 4.2097 11.0868 0 4.5924 8.4852 0 8.4852 7.7781 0 7.7781
  [4,16,10.1629,0,4.2097,11.0868,0,4.5924,8.4852,0,8.4852,7.7781,0,7.7781],
// 4 16 7.7781 0 7.7781 8.4852 0 8.4852 4.5924 0 11.0868 4.2097 0 10.1629
  [4,16,7.7781,0,7.7781,8.4852,0,8.4852,4.5924,0,11.0868,4.2097,0,10.1629],
// 4 16 4.2097 0 10.1629 4.5924 0 11.0868 0 0 12 0 0 11
  [4,16,4.2097,0,10.1629,4.5924,0,11.0868,0,0,12,0,0,11],
// 4 16 0 0 11 0 0 12 -4.5924 0 11.0868 -4.2097 0 10.1629
  [4,16,0,0,11,0,0,12,-4.5924,0,11.0868,-4.2097,0,10.1629],
// 4 16 -4.2097 0 10.1629 -4.5924 0 11.0868 -8.4852 0 8.4852 -7.7781 0 7.7781
  [4,16,-4.2097,0,10.1629,-4.5924,0,11.0868,-8.4852,0,8.4852,-7.7781,0,7.7781],
// 4 16 -7.7781 0 7.7781 -8.4852 0 8.4852 -11.0868 0 4.5924 -10.1629 0 4.2097
  [4,16,-7.7781,0,7.7781,-8.4852,0,8.4852,-11.0868,0,4.5924,-10.1629,0,4.2097],
// 4 16 -10.1629 0 4.2097 -11.0868 0 4.5924 -12 0 0 -11 0 0
  [4,16,-10.1629,0,4.2097,-11.0868,0,4.5924,-12,0,0,-11,0,0],
// 4 16 -11 0 0 -12 0 0 -11.0868 0 -4.5924 -10.1629 0 -4.2097
  [4,16,-11,0,0,-12,0,0,-11.0868,0,-4.5924,-10.1629,0,-4.2097],
// 4 16 -10.1629 0 -4.2097 -11.0868 0 -4.5924 -8.4852 0 -8.4852 -7.7781 0 -7.7781
  [4,16,-10.1629,0,-4.2097,-11.0868,0,-4.5924,-8.4852,0,-8.4852,-7.7781,0,-7.7781],
// 4 16 -7.7781 0 -7.7781 -8.4852 0 -8.4852 -4.5924 0 -11.0868 -4.2097 0 -10.1629
  [4,16,-7.7781,0,-7.7781,-8.4852,0,-8.4852,-4.5924,0,-11.0868,-4.2097,0,-10.1629],
// 4 16 -4.2097 0 -10.1629 -4.5924 0 -11.0868 0 0 -12 0 0 -11
  [4,16,-4.2097,0,-10.1629,-4.5924,0,-11.0868,0,0,-12,0,0,-11],
// 4 16 0 0 -11 0 0 -12 4.5924 0 -11.0868 4.2097 0 -10.1629
  [4,16,0,0,-11,0,0,-12,4.5924,0,-11.0868,4.2097,0,-10.1629],
// 4 16 4.2097 0 -10.1629 4.5924 0 -11.0868 8.4852 0 -8.4852 7.7781 0 -7.7781
  [4,16,4.2097,0,-10.1629,4.5924,0,-11.0868,8.4852,0,-8.4852,7.7781,0,-7.7781],
// 4 16 7.7781 0 -7.7781 8.4852 0 -8.4852 11.0868 0 -4.5924 10.1629 0 -4.2097
  [4,16,7.7781,0,-7.7781,8.4852,0,-8.4852,11.0868,0,-4.5924,10.1629,0,-4.2097],
// 4 16 10.1629 0 -4.2097 11.0868 0 -4.5924 12 0 0 11 0 0
  [4,16,10.1629,0,-4.2097,11.0868,0,-4.5924,12,0,0,11,0,0],
// 0
];
module ldraw_lib__4_4rin11(step=0, col=false, unit=2/5, alt=false, line=0.2, solid=!$preview)
    makepoly(ldraw_lib__4_4rin11(solid), step=step, col=col, unit=unit, alt=alt, line=line, solid=solid);
ldraw_lib__4_4rin11(line=0.2);
// file: ../p/4-4edge.scad
use <../lib.scad>
$fa=1; $fs=0.2;
function ldraw_lib__4_4edge(realsolid=false) = [
// 0 Circle 1.0
// 0 Name: 4-4edge.dat
// 0 Author: James Jessiman
// 0 !LDRAW_ORG Primitive UPDATE 2017-01
// 0 !LICENSE Licensed under CC BY 2.0 and CC BY 4.0 : see CAreadme.txt
// 
// 0 BFC CERTIFY CCW
  [0,"BFC","CERTIFY"],
  [0,"BFC","CCW"],
// 
// 0 !HISTORY 1998-12-15 [PTadmin] Official Update 1998-10
// 0 !HISTORY 2005-12-28 [PTadmin] Official Update 2005-01
// 0 !HISTORY 2007-06-24 [PTadmin] Header formatted for Contributor Agreement
// 0 !HISTORY 2008-07-01 [PTadmin] Official Update 2008-01
// 0 !HISTORY 2017-01-15 [Steffen] BFCed
// 0 !HISTORY 2017-12-30 [PTadmin] Official Update 2017-01
// 
// 
// 2 24 1 0 0 0.9239 0 0.3827
  [2,24,1,0,0,0.9239,0,0.3827],
// 2 24 0.9239 0 0.3827 0.7071 0 0.7071
  [2,24,0.9239,0,0.3827,0.7071,0,0.7071],
// 2 24 0.7071 0 0.7071 0.3827 0 0.9239
  [2,24,0.7071,0,0.7071,0.3827,0,0.9239],
// 2 24 0.3827 0 0.9239 0 0 1
  [2,24,0.3827,0,0.9239,0,0,1],
// 2 24 0 0 1 -0.3827 0 0.9239
  [2,24,0,0,1,-0.3827,0,0.9239],
// 2 24 -0.3827 0 0.9239 -0.7071 0 0.7071
  [2,24,-0.3827,0,0.9239,-0.7071,0,0.7071],
// 2 24 -0.7071 0 0.7071 -0.9239 0 0.3827
  [2,24,-0.7071,0,0.7071,-0.9239,0,0.3827],
// 2 24 -0.9239 0 0.3827 -1 0 -0
  [2,24,-0.9239,0,0.3827,-1,0,-0],
// 2 24 -1 0 -0 -0.9239 0 -0.3827
  [2,24,-1,0,-0,-0.9239,0,-0.3827],
// 2 24 -0.9239 0 -0.3827 -0.7071 0 -0.7071
  [2,24,-0.9239,0,-0.3827,-0.7071,0,-0.7071],
// 2 24 -0.7071 0 -0.7071 -0.3827 0 -0.9239
  [2,24,-0.7071,0,-0.7071,-0.3827,0,-0.9239],
// 2 24 -0.3827 0 -0.9239 0 0 -1
  [2,24,-0.3827,0,-0.9239,0,0,-1],
// 2 24 0 0 -1 0.3827 0 -0.9239
  [2,24,0,0,-1,0.3827,0,-0.9239],
// 2 24 0.3827 0 -0.9239 0.7071 0 -0.7071
  [2,24,0.3827,0,-0.9239,0.7071,0,-0.7071],
// 2 24 0.7071 0 -0.7071 0.9239 0 -0.3827
  [2,24,0.7071,0,-0.7071,0.9239,0,-0.3827],
// 2 24 0.9239 0 -0.3827 1 0 0
  [2,24,0.9239,0,-0.3827,1,0,0],
];
module ldraw_lib__4_4edge(step=0, col=false, unit=2/5, alt=false, line=0.2, solid=!$preview)
    makepoly(ldraw_lib__4_4edge(solid), step=step, col=col, unit=unit, alt=alt, line=line, solid=solid);
ldraw_lib__4_4edge(line=0.2);
// file: ../p/4-4disc.scad
use <../lib.scad>
$fa=1; $fs=0.2;
function ldraw_lib__4_4disc(realsolid=false) = [
// 0 Disc 1.0
// 0 Name: 4-4disc.dat
// 0 Author: James Jessiman
// 0 !LDRAW_ORG Primitive UPDATE 2002-02
// 0 !LICENSE Licensed under CC BY 2.0 and CC BY 4.0 : see CAreadme.txt
// 
// 0 BFC CERTIFY CCW
  [0,"BFC","CERTIFY"],
  [0,"BFC","CCW"],
// 
// 0 !HISTORY 1998-12-15 [PTadmin] Official Update 1998-10
// 0 !HISTORY 2002-03-23 [sbliss] Added BFC statement
// 0 !HISTORY 2002-04-25 [PTadmin] Official Update 2002-02
// 0 !HISTORY 2007-06-24 [PTadmin] Header formatted for Contributor Agreement
// 0 !HISTORY 2008-07-01 [PTadmin] Official Update 2008-01
// 
// 
// 3 16 0 0 0 1 0 0 0.9239 0 0.3827
  [3,16,0,0,0,1,0,0,0.9239,0,0.3827],
// 3 16 0 0 0 0.9239 0 0.3827 0.7071 0 0.7071
  [3,16,0,0,0,0.9239,0,0.3827,0.7071,0,0.7071],
// 3 16 0 0 0 0.7071 0 0.7071 0.3827 0 0.9239
  [3,16,0,0,0,0.7071,0,0.7071,0.3827,0,0.9239],
// 3 16 0 0 0 0.3827 0 0.9239 0 0 1
  [3,16,0,0,0,0.3827,0,0.9239,0,0,1],
// 3 16 0 0 0 0 0 1 -0.3827 0 0.9239
  [3,16,0,0,0,0,0,1,-0.3827,0,0.9239],
// 3 16 0 0 0 -0.3827 0 0.9239 -0.7071 0 0.7071
  [3,16,0,0,0,-0.3827,0,0.9239,-0.7071,0,0.7071],
// 3 16 0 0 0 -0.7071 0 0.7071 -0.9239 0 0.3827
  [3,16,0,0,0,-0.7071,0,0.7071,-0.9239,0,0.3827],
// 3 16 0 0 0 -0.9239 0 0.3827 -1 0 -0
  [3,16,0,0,0,-0.9239,0,0.3827,-1,0,-0],
// 3 16 0 0 0 -1 0 -0 -0.9239 0 -0.3827
  [3,16,0,0,0,-1,0,-0,-0.9239,0,-0.3827],
// 3 16 0 0 0 -0.9239 0 -0.3827 -0.7071 0 -0.7071
  [3,16,0,0,0,-0.9239,0,-0.3827,-0.7071,0,-0.7071],
// 3 16 0 0 0 -0.7071 0 -0.7071 -0.3827 0 -0.9239
  [3,16,0,0,0,-0.7071,0,-0.7071,-0.3827,0,-0.9239],
// 3 16 0 0 0 -0.3827 0 -0.9239 0 0 -1
  [3,16,0,0,0,-0.3827,0,-0.9239,0,0,-1],
// 3 16 0 0 0 0 0 -1 0.3827 0 -0.9239
  [3,16,0,0,0,0,0,-1,0.3827,0,-0.9239],
// 3 16 0 0 0 0.3827 0 -0.9239 0.7071 0 -0.7071
  [3,16,0,0,0,0.3827,0,-0.9239,0.7071,0,-0.7071],
// 3 16 0 0 0 0.7071 0 -0.7071 0.9239 0 -0.3827
  [3,16,0,0,0,0.7071,0,-0.7071,0.9239,0,-0.3827],
// 3 16 0 0 0 0.9239 0 -0.3827 1 0 0
  [3,16,0,0,0,0.9239,0,-0.3827,1,0,0],
// 0
];
module ldraw_lib__4_4disc(step=0, col=false, unit=2/5, alt=false, line=0.2, solid=!$preview)
    makepoly(ldraw_lib__4_4disc(solid), step=step, col=col, unit=unit, alt=alt, line=line, solid=solid);
ldraw_lib__4_4disc(line=0.2);
// file: ../p/4-4cyli.scad
use <../lib.scad>
$fa=1; $fs=0.2;
function ldraw_lib__4_4cyli(realsolid=false) = [
// 0 Cylinder 1.0
// 0 Name: 4-4cyli.dat
// 0 Author: James Jessiman
// 0 !LDRAW_ORG Primitive UPDATE 2005-01
// 0 !LICENSE Licensed under CC BY 2.0 and CC BY 4.0 : see CAreadme.txt
// 
// 0 BFC CERTIFY CCW
  [0,"BFC","CERTIFY"],
  [0,"BFC","CCW"],
// 
// 0 !HISTORY 1998-12-15 [PTadmin] Official Update 1998-10
// 0 !HISTORY 2002-03-23 [sbliss] Added BFC statement; merged headers from files in distributions LDraw 0.27 and Complete.
// 0 !HISTORY 2002-04-25 [PTadmin] Official Update 2002-02
// 0 !HISTORY 2004-12-14 [guyvivan] BFC CCW
// 0 !HISTORY 2005-12-28 [PTadmin] Official Update 2005-01
// 0 !HISTORY 2007-06-24 [PTadmin] Header formatted for Contributor Agreement
// 0 !HISTORY 2008-07-01 [PTadmin] Official Update 2008-01
// 
// 
// 4 16 1 1 0 0.9239 1 0.3827 0.9239 0 0.3827 1 0 0
  [4,16,1,1,0,0.9239,1,0.3827,0.9239,0,0.3827,1,0,0],
// 5 24 1 0 0 1 1 0 0.9239 0 0.3827 0.9239 0 -0.3827
  [5,24,1,0,0,1,1,0,0.9239,0,0.3827,0.9239,0,-0.3827],
// 4 16 0.9239 1 0.3827 0.7071 1 0.7071 0.7071 0 0.7071 0.9239 0 0.3827
  [4,16,0.9239,1,0.3827,0.7071,1,0.7071,0.7071,0,0.7071,0.9239,0,0.3827],
// 5 24 0.9239 0 0.3827 0.9239 1 0.3827 0.7071 0 0.7071 1 0 0
  [5,24,0.9239,0,0.3827,0.9239,1,0.3827,0.7071,0,0.7071,1,0,0],
// 4 16 0.7071 1 0.7071 0.3827 1 0.9239 0.3827 0 0.9239 0.7071 0 0.7071
  [4,16,0.7071,1,0.7071,0.3827,1,0.9239,0.3827,0,0.9239,0.7071,0,0.7071],
// 5 24 0.7071 0 0.7071 0.7071 1 0.7071 0.3827 0 0.9239 0.9239 0 0.3827
  [5,24,0.7071,0,0.7071,0.7071,1,0.7071,0.3827,0,0.9239,0.9239,0,0.3827],
// 4 16 0.3827 1 0.9239 0 1 1 0 0 1 0.3827 0 0.9239
  [4,16,0.3827,1,0.9239,0,1,1,0,0,1,0.3827,0,0.9239],
// 5 24 0.3827 0 0.9239 0.3827 1 0.9239 0 0 1 0.7071 0 0.7071
  [5,24,0.3827,0,0.9239,0.3827,1,0.9239,0,0,1,0.7071,0,0.7071],
// 4 16 0 1 1 -0.3827 1 0.9239 -0.3827 0 0.9239 0 0 1
  [4,16,0,1,1,-0.3827,1,0.9239,-0.3827,0,0.9239,0,0,1],
// 5 24 0 0 1 0 1 1 -0.3827 0 0.9239 0.3827 0 0.9239
  [5,24,0,0,1,0,1,1,-0.3827,0,0.9239,0.3827,0,0.9239],
// 4 16 -0.3827 1 0.9239 -0.7071 1 0.7071 -0.7071 0 0.7071 -0.3827 0 0.9239
  [4,16,-0.3827,1,0.9239,-0.7071,1,0.7071,-0.7071,0,0.7071,-0.3827,0,0.9239],
// 5 24 -0.3827 0 0.9239 -0.3827 1 0.9239 -0.7071 0 0.7071 0 0 1
  [5,24,-0.3827,0,0.9239,-0.3827,1,0.9239,-0.7071,0,0.7071,0,0,1],
// 4 16 -0.7071 1 0.7071 -0.9239 1 0.3827 -0.9239 0 0.3827 -0.7071 0 0.7071
  [4,16,-0.7071,1,0.7071,-0.9239,1,0.3827,-0.9239,0,0.3827,-0.7071,0,0.7071],
// 5 24 -0.7071 0 0.7071 -0.7071 1 0.7071 -0.9239 0 0.3827 -0.3827 0 0.9239
  [5,24,-0.7071,0,0.7071,-0.7071,1,0.7071,-0.9239,0,0.3827,-0.3827,0,0.9239],
// 4 16 -0.9239 1 0.3827 -1 1 0 -1 0 0 -0.9239 0 0.3827
  [4,16,-0.9239,1,0.3827,-1,1,0,-1,0,0,-0.9239,0,0.3827],
// 5 24 -0.9239 0 0.3827 -0.9239 1 0.3827 -1 0 0 -0.7071 0 0.7071
  [5,24,-0.9239,0,0.3827,-0.9239,1,0.3827,-1,0,0,-0.7071,0,0.7071],
// 4 16 -1 1 0 -0.9239 1 -0.3827 -0.9239 0 -0.3827 -1 0 0
  [4,16,-1,1,0,-0.9239,1,-0.3827,-0.9239,0,-0.3827,-1,0,0],
// 5 24 -1 0 0 -1 1 0 -0.9239 0 -0.3827 -0.9239 0 0.3827
  [5,24,-1,0,0,-1,1,0,-0.9239,0,-0.3827,-0.9239,0,0.3827],
// 4 16 -0.9239 1 -0.3827 -0.7071 1 -0.7071 -0.7071 0 -0.7071 -0.9239 0 -0.3827
  [4,16,-0.9239,1,-0.3827,-0.7071,1,-0.7071,-0.7071,0,-0.7071,-0.9239,0,-0.3827],
// 5 24 -0.9239 0 -0.3827 -0.9239 1 -0.3827 -0.7071 0 -0.7071 -1 0 0
  [5,24,-0.9239,0,-0.3827,-0.9239,1,-0.3827,-0.7071,0,-0.7071,-1,0,0],
// 4 16 -0.7071 1 -0.7071 -0.3827 1 -0.9239 -0.3827 0 -0.9239 -0.7071 0 -0.7071
  [4,16,-0.7071,1,-0.7071,-0.3827,1,-0.9239,-0.3827,0,-0.9239,-0.7071,0,-0.7071],
// 5 24 -0.7071 0 -0.7071 -0.7071 1 -0.7071 -0.3827 0 -0.9239 -0.9239 0 -0.3827
  [5,24,-0.7071,0,-0.7071,-0.7071,1,-0.7071,-0.3827,0,-0.9239,-0.9239,0,-0.3827],
// 4 16 -0.3827 1 -0.9239 0 1 -1 0 0 -1 -0.3827 0 -0.9239
  [4,16,-0.3827,1,-0.9239,0,1,-1,0,0,-1,-0.3827,0,-0.9239],
// 5 24 -0.3827 0 -0.9239 -0.3827 1 -0.9239 0 0 -1 -0.7071 0 -0.7071
  [5,24,-0.3827,0,-0.9239,-0.3827,1,-0.9239,0,0,-1,-0.7071,0,-0.7071],
// 4 16 0 1 -1 0.3827 1 -0.9239 0.3827 0 -0.9239 0 0 -1
  [4,16,0,1,-1,0.3827,1,-0.9239,0.3827,0,-0.9239,0,0,-1],
// 5 24 0 0 -1 0 1 -1 0.3827 0 -0.9239 -0.3827 0 -0.9239
  [5,24,0,0,-1,0,1,-1,0.3827,0,-0.9239,-0.3827,0,-0.9239],
// 4 16 0.3827 1 -0.9239 0.7071 1 -0.7071 0.7071 0 -0.7071 0.3827 0 -0.9239
  [4,16,0.3827,1,-0.9239,0.7071,1,-0.7071,0.7071,0,-0.7071,0.3827,0,-0.9239],
// 5 24 0.3827 0 -0.9239 0.3827 1 -0.9239 0.7071 0 -0.7071 0 0 -1
  [5,24,0.3827,0,-0.9239,0.3827,1,-0.9239,0.7071,0,-0.7071,0,0,-1],
// 4 16 0.7071 1 -0.7071 0.9239 1 -0.3827 0.9239 0 -0.3827 0.7071 0 -0.7071
  [4,16,0.7071,1,-0.7071,0.9239,1,-0.3827,0.9239,0,-0.3827,0.7071,0,-0.7071],
// 5 24 0.7071 0 -0.7071 0.7071 1 -0.7071 0.9239 0 -0.3827 0.3827 0 -0.9239
  [5,24,0.7071,0,-0.7071,0.7071,1,-0.7071,0.9239,0,-0.3827,0.3827,0,-0.9239],
// 4 16 0.9239 1 -0.3827 1 1 0 1 0 0 0.9239 0 -0.3827
  [4,16,0.9239,1,-0.3827,1,1,0,1,0,0,0.9239,0,-0.3827],
// 5 24 0.9239 0 -0.3827 0.9239 1 -0.3827 1 0 0 0.7071 0 -0.7071
  [5,24,0.9239,0,-0.3827,0.9239,1,-0.3827,1,0,0,0.7071,0,-0.7071],
// 0
];
module ldraw_lib__4_4cyli(step=0, col=false, unit=2/5, alt=false, line=0.2, solid=!$preview)
    makepoly(ldraw_lib__4_4cyli(solid), step=step, col=col, unit=unit, alt=alt, line=line, solid=solid);
ldraw_lib__4_4cyli(line=0.2);
// main file
use <../lib.scad>
use <../p/4-4cyli.scad>
use <../p/4-4disc.scad>
use <../p/4-4edge.scad>
use <../p/4-4rin11.scad>
use <../p/4-4rin12.scad>
use <../p/4-8sphe.scad>
$fa=1; $fs=0.2;
function ldraw_lib__32134(realsolid=false) = [
// 0 ~Technic Competition Arrow Rubber Tip
// 0 Name: 32134.dat
// 0 Author: Marc Klein [marckl]
// 0 !LDRAW_ORG Part UPDATE 2013-01
// 0 !LICENSE Licensed under CC BY 2.0 and CC BY 4.0 : see CAreadme.txt
// 
// 0 BFC CERTIFY CCW
  [0,"BFC","CERTIFY"],
  [0,"BFC","CCW"],
// 
// 0 !CMDLINE -c256
// 
// 0 !HISTORY 2004-11-01 [sbliss] Replaced polygons with primitives; BFC'ed
// 0 !HISTORY 2004-11-06 [PTadmin] Official Update 2004-04
// 0 !HISTORY 2007-05-13 [PTadmin] Header formatted for Contributor Agreement
// 0 !HISTORY 2008-07-01 [PTadmin] Official Update 2008-01
// 0 !HISTORY 2009-06-08 [PTadmin] Renamed from 155
// 0 !HISTORY 2010-11-14 [Steffen] adjusted origin
// 0 !HISTORY 2013-07-21 [PTadmin] Official Update 2013-01
// 
// 
// 0 // Created with stl2dat conversion tool
// 
// 1 16 0 0 14 22 0 0 0 0 22 0 -1 0 4-4edge.dat
  [1,16,0,0,14,22,0,0,0,0,22,0,-1,0, ldraw_lib__4_4edge(realsolid)],
// 1 16 0 0 0 22 0 0 0 0 22 0 -1 0 4-4edge.dat
  [1,16,0,0,0,22,0,0,0,0,22,0,-1,0, ldraw_lib__4_4edge(realsolid)],
// 0 BFC INVERTNEXT
  [0,"BFC","INVERTNEXT"],
// 1 16 0 0 14 22 0 0 0 0 22 0 -14 0 4-4cyli.dat
  [1,16,0,0,14,22,0,0,0,0,22,0,-14,0, ldraw_lib__4_4cyli(realsolid)],
// 1 16 0 0 16 26 0 0 0 0 26 0 -16 0 4-4cyli.dat
  [1,16,0,0,16,26,0,0,0,0,26,0,-16,0, ldraw_lib__4_4cyli(realsolid)],
// 1 16 0 0 0 26 0 0 0 0 26 0 -1 0 4-4edge.dat
  [1,16,0,0,0,26,0,0,0,0,26,0,-1,0, ldraw_lib__4_4edge(realsolid)],
// 1 16 0 0 16 26 0 0 0 0 26 0 26 0 4-8sphe.dat
  [1,16,0,0,16,26,0,0,0,0,26,0,26,0, ldraw_lib__4_8sphe(realsolid)],
// 1 16 0 0 14 22 0 0 0 0 22 0 1 0 4-4disc.dat
  [1,16,0,0,14,22,0,0,0,0,22,0,1,0, ldraw_lib__4_4disc(realsolid)],
// 1 16 0 0 0 2 0 0 0 0 2 0 1 0 4-4rin11.dat
  [1,16,0,0,0,2,0,0,0,0,2,0,1,0, ldraw_lib__4_4rin11(realsolid)],
// 1 16 0 0 0 2 0 0 0 0 2 0 1 0 4-4rin12.dat
  [1,16,0,0,0,2,0,0,0,0,2,0,1,0, ldraw_lib__4_4rin12(realsolid)],
// 
];
module ldraw_lib__32134(step=0, col=false, unit=2/5, alt=false, line=0.2, solid=!$preview)
    makepoly(ldraw_lib__32134(solid), step=step, col=col, unit=unit, alt=alt, line=line, solid=solid);
ldraw_lib__32134(line=0.2);
